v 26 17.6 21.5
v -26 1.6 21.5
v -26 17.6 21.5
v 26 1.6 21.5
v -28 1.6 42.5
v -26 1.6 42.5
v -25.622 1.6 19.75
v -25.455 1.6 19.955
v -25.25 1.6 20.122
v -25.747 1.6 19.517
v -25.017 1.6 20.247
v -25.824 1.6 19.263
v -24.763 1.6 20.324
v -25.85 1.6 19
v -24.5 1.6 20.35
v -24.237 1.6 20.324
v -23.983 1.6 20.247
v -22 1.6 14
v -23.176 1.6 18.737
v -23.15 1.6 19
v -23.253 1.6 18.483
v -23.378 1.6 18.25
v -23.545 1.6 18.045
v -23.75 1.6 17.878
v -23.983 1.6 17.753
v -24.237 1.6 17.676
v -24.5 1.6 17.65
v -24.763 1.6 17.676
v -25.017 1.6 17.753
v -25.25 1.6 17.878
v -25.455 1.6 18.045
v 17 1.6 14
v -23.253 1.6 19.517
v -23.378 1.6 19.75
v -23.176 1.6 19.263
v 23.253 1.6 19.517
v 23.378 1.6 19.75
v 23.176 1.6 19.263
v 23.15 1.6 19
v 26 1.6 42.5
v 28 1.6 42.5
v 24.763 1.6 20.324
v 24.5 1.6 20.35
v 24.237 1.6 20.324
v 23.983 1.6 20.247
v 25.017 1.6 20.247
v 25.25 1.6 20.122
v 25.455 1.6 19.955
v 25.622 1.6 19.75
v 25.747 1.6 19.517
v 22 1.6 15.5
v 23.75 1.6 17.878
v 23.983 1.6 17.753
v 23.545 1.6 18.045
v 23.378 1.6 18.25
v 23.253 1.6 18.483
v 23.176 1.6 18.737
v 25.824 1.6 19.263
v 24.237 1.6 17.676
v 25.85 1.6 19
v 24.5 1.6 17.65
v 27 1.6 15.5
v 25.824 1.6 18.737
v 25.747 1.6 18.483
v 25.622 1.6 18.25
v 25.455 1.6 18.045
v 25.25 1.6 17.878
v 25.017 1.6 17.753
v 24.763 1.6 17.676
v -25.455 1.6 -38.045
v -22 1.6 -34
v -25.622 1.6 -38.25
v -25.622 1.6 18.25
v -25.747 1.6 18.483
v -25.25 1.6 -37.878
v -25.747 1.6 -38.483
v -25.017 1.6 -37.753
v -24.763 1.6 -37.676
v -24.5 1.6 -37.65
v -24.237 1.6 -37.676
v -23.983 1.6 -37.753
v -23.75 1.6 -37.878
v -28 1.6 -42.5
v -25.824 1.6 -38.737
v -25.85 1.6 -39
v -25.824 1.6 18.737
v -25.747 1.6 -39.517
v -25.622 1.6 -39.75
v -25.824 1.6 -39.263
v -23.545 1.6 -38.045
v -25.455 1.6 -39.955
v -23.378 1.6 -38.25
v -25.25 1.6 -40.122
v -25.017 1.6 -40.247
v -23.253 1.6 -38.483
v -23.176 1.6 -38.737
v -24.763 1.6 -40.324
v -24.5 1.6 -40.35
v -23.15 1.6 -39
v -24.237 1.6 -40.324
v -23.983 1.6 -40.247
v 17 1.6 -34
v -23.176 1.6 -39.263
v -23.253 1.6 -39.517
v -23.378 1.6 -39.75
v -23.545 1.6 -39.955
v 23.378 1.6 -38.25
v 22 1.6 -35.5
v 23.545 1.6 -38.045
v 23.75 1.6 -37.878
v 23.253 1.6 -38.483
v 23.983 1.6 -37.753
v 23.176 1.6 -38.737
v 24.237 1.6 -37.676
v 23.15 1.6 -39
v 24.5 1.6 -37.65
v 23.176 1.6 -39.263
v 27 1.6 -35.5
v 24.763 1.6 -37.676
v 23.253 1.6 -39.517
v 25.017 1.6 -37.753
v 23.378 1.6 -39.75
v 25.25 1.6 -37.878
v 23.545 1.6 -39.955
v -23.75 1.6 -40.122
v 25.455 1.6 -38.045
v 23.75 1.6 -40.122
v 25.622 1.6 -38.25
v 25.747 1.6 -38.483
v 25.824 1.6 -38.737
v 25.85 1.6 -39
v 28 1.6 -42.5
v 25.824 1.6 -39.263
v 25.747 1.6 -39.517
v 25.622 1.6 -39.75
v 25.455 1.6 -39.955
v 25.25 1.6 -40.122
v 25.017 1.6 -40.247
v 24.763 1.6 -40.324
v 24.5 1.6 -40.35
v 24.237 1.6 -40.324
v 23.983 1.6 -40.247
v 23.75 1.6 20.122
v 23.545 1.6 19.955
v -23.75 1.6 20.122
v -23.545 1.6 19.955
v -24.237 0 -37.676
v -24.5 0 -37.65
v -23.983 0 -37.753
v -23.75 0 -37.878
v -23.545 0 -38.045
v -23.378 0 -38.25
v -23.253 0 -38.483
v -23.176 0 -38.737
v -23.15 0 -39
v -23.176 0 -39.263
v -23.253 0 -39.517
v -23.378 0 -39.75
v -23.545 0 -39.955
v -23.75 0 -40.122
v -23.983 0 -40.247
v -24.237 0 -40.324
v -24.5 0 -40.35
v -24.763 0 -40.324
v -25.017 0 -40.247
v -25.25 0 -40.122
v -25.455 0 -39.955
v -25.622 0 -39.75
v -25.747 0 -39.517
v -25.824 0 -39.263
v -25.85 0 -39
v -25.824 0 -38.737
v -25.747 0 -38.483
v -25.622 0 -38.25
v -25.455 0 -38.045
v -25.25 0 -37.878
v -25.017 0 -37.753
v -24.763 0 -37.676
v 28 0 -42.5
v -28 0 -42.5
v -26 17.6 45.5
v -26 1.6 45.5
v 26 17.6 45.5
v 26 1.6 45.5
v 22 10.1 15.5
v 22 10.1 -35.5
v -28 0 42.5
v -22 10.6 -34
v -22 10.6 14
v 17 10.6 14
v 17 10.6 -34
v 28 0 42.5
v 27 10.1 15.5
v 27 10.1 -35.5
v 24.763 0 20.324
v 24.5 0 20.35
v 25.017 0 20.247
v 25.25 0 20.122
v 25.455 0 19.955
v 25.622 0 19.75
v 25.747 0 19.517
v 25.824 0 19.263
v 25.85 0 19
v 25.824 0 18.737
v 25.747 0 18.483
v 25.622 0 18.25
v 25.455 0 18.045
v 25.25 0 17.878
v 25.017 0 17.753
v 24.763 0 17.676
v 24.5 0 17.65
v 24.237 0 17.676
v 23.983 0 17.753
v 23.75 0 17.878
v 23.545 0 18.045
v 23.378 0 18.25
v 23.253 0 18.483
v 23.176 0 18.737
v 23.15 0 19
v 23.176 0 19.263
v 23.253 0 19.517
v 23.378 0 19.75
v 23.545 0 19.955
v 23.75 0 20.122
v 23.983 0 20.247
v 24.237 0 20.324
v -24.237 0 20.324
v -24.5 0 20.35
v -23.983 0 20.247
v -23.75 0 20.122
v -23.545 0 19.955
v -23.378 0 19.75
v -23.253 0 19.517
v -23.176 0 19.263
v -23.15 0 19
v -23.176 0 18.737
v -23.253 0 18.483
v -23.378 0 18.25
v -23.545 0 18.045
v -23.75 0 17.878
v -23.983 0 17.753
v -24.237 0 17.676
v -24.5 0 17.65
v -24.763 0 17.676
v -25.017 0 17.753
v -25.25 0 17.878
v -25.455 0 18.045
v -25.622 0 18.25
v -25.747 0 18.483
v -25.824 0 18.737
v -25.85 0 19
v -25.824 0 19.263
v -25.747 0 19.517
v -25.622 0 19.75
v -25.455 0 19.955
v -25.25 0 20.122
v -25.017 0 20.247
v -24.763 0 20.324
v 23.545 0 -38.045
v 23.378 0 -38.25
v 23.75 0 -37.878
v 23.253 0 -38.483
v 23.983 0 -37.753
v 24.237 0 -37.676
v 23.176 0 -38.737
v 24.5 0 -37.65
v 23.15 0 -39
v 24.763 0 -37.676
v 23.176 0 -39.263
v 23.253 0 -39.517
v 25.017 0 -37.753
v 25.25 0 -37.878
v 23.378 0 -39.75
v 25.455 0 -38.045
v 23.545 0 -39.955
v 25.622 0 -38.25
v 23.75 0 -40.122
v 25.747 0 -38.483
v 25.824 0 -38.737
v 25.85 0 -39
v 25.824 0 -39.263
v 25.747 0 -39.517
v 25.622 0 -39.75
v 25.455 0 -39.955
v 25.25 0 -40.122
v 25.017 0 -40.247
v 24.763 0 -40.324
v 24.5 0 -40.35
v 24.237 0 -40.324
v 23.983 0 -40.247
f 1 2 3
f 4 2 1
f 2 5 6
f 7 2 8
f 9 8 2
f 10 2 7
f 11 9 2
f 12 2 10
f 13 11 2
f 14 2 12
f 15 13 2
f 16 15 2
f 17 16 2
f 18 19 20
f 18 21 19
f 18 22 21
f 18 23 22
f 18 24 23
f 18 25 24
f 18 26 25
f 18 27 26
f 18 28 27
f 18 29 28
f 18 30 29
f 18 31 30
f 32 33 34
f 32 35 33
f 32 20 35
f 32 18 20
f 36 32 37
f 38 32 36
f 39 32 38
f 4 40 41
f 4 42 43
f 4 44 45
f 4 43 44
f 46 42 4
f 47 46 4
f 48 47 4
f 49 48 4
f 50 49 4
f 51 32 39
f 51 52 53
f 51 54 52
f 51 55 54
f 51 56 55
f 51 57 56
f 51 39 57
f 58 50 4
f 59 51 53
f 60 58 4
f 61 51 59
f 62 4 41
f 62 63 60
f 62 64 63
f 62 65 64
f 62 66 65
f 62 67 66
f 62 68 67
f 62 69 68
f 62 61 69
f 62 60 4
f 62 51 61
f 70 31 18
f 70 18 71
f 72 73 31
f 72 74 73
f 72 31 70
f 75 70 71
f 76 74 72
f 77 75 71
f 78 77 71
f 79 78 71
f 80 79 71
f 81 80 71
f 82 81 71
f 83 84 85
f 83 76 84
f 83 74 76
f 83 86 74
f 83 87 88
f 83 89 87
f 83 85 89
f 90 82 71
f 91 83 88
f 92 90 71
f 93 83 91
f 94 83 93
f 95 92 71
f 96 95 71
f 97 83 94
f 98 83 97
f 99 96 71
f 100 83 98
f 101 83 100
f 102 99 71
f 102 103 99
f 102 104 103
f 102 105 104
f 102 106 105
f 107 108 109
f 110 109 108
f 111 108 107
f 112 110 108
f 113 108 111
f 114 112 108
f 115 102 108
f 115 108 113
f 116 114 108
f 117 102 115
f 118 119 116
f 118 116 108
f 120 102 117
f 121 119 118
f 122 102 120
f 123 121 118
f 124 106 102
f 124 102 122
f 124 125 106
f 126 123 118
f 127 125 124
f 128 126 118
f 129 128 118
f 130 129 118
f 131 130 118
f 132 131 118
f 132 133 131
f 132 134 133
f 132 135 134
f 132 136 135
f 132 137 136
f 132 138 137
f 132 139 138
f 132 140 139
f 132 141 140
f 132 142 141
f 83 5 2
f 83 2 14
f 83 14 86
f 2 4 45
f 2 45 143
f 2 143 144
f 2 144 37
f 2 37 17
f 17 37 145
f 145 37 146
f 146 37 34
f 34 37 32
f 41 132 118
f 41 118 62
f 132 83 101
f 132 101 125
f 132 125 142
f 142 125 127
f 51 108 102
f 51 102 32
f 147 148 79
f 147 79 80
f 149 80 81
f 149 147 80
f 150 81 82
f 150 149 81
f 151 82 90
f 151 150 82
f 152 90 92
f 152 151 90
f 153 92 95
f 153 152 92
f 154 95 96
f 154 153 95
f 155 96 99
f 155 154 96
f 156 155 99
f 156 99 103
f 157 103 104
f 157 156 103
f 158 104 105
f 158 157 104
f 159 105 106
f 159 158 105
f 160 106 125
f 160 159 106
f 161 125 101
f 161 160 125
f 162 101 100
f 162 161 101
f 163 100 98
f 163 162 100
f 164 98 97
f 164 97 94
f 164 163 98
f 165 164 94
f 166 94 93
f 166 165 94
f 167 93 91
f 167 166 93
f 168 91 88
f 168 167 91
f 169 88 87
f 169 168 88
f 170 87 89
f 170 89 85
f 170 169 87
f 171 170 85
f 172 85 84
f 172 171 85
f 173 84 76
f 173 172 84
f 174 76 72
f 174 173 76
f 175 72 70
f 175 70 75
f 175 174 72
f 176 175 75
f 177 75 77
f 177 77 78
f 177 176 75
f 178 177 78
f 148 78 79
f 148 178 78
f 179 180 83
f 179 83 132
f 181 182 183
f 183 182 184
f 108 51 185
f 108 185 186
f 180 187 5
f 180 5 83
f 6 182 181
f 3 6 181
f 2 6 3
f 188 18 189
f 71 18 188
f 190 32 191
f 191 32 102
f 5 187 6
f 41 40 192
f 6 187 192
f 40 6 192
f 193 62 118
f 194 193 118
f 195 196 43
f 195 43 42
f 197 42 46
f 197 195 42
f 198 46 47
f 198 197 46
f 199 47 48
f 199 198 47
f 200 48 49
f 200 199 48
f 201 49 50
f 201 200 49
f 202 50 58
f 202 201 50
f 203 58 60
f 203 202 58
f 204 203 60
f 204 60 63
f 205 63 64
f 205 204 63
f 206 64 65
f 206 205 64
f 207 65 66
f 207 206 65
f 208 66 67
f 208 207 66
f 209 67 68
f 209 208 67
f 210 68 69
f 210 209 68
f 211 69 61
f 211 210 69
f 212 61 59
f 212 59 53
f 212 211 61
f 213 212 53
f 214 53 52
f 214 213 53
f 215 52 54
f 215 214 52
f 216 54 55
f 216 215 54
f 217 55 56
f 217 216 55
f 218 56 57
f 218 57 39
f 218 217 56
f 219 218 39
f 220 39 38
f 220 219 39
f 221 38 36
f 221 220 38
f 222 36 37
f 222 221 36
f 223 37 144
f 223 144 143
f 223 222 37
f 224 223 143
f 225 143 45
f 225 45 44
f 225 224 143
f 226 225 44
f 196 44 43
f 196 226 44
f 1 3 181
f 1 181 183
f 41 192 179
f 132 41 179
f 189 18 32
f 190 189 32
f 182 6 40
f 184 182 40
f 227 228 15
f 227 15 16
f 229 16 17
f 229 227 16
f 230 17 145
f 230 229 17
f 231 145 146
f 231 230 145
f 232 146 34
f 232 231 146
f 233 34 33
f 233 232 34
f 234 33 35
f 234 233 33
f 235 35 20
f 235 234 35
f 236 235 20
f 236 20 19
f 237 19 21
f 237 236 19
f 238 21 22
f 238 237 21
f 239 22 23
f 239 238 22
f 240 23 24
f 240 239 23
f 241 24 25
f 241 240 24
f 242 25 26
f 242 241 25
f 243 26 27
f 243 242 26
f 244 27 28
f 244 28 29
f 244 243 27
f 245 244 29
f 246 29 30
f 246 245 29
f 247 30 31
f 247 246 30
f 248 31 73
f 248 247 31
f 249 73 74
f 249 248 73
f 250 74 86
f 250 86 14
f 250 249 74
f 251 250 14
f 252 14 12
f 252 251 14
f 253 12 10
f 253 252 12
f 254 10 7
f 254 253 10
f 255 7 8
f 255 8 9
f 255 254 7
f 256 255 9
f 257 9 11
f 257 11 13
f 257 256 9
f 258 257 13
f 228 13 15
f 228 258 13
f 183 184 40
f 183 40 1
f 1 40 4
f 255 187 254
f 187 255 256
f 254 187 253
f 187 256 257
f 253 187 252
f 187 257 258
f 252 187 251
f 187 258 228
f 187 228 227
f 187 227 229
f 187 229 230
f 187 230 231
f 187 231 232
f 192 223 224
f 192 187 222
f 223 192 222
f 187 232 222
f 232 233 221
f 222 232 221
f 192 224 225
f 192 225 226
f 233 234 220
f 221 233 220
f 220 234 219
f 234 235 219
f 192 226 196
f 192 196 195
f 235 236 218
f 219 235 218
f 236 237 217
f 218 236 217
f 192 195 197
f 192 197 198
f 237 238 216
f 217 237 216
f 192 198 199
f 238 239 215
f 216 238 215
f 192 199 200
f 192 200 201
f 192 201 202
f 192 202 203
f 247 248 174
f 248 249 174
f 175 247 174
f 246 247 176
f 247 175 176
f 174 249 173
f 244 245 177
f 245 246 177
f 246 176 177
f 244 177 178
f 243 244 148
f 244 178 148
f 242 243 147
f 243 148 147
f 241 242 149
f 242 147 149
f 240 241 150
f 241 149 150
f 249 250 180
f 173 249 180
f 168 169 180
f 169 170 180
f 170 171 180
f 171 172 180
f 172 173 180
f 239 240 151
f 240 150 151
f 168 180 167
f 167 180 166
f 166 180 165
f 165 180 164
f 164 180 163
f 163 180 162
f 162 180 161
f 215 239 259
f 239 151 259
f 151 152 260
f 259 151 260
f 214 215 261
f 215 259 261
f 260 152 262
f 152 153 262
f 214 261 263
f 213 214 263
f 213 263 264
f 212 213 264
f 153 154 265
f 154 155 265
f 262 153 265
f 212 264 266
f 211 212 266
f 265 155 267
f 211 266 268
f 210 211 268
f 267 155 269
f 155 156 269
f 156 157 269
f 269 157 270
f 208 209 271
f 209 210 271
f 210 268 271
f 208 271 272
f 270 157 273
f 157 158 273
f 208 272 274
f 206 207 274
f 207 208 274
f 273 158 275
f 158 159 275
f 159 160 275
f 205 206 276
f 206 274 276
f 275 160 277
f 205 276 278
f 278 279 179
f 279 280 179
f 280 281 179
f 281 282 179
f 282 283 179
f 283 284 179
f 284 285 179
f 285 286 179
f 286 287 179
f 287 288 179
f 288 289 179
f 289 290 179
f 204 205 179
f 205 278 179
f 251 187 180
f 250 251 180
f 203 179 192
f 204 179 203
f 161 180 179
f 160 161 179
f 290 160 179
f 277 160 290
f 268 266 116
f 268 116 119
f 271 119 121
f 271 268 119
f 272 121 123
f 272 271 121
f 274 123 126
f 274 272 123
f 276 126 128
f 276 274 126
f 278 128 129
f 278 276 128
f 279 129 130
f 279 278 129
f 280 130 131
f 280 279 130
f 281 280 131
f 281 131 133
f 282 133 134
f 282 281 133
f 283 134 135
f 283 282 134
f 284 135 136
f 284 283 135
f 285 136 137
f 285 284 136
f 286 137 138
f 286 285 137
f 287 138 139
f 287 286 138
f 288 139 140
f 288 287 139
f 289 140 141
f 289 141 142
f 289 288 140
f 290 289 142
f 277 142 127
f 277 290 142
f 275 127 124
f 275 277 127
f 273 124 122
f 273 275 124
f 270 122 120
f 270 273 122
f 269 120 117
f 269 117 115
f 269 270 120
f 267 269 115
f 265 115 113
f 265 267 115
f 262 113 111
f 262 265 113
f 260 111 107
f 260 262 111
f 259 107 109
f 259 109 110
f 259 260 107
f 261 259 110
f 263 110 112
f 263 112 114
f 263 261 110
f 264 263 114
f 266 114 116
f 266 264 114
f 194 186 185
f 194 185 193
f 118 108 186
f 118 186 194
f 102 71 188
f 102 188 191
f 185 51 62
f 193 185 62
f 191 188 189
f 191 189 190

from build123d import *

# Parameters (mm, degrees)
SK_BOARD_W              = 56
SK_BOARD_H              = 85
EX_BOARD_DEPTH          = 1.6
SK_MOUNTHOLES_4X_R      = 1.35
CUT_MOUNTHOLES_4X_DEPTH = 1.6
SK_PORTS_USB_ETH_W      = 52
SK_PORTS_USB_ETH_H      = 24
EX_PORTS_USB_ETH_DEPTH  = 16
SK_ACTIVECOOLER_W       = 39
SK_ACTIVECOOLER_H       = 48
EX_ACTIVECOOLER_DEPTH   = 9
SK_GPIO_W               = 5
SK_GPIO_H               = 51
EX_GPIO_DEPTH           = 8.5


with BuildPart() as part:
    # SK_Board → EX_Board (new body)
    with BuildSketch(Plane(origin=(0, 0, 0), x_dir=(1, 0, 0), z_dir=(0, 1, 0))):
        Rectangle(SK_BOARD_W, SK_BOARD_H)
    extrude(amount=EX_BOARD_DEPTH)

    # SK_MountHoles_4x → CUT_MountHoles_4x (cut)
    with BuildSketch(Plane(origin=(0, 0, 0), x_dir=(1, 0, 0), z_dir=(0, 1, 0))):
        with Locations((-24.5, 39)):
            Circle(SK_MOUNTHOLES_4X_R)
        with Locations((24.5, 39)):
            Circle(SK_MOUNTHOLES_4X_R)
        with Locations((-24.5, -19)):
            Circle(SK_MOUNTHOLES_4X_R)
        with Locations((24.5, -19)):
            Circle(SK_MOUNTHOLES_4X_R)
    extrude(amount=CUT_MOUNTHOLES_4X_DEPTH, mode=Mode.SUBTRACT)

    # SK_Ports_USB_ETH → EX_Ports_USB_ETH (add)
    with BuildSketch(Plane(origin=(0, 1.6, 0), x_dir=(1, 0, 0), z_dir=(0, 1, 0))):
        with Locations((0, -33.5)):
            Rectangle(SK_PORTS_USB_ETH_W, SK_PORTS_USB_ETH_H)
    extrude(amount=EX_PORTS_USB_ETH_DEPTH)

    # SK_ActiveCooler → EX_ActiveCooler (add)
    with BuildSketch(Plane(origin=(0, 1.6, 0), x_dir=(1, 0, 0), z_dir=(0, 1, 0))):
        with Locations((-2.5, 10)):
            Rectangle(SK_ACTIVECOOLER_W, SK_ACTIVECOOLER_H)
    extrude(amount=EX_ACTIVECOOLER_DEPTH)

    # SK_GPIO → EX_GPIO (add)
    with BuildSketch(Plane(origin=(0, 1.6, 0), x_dir=(1, 0, 0), z_dir=(0, 1, 0))):
        with Locations((24.5, 10)):
            Rectangle(SK_GPIO_W, SK_GPIO_H)
    extrude(amount=EX_GPIO_DEPTH)


solid = part.part
